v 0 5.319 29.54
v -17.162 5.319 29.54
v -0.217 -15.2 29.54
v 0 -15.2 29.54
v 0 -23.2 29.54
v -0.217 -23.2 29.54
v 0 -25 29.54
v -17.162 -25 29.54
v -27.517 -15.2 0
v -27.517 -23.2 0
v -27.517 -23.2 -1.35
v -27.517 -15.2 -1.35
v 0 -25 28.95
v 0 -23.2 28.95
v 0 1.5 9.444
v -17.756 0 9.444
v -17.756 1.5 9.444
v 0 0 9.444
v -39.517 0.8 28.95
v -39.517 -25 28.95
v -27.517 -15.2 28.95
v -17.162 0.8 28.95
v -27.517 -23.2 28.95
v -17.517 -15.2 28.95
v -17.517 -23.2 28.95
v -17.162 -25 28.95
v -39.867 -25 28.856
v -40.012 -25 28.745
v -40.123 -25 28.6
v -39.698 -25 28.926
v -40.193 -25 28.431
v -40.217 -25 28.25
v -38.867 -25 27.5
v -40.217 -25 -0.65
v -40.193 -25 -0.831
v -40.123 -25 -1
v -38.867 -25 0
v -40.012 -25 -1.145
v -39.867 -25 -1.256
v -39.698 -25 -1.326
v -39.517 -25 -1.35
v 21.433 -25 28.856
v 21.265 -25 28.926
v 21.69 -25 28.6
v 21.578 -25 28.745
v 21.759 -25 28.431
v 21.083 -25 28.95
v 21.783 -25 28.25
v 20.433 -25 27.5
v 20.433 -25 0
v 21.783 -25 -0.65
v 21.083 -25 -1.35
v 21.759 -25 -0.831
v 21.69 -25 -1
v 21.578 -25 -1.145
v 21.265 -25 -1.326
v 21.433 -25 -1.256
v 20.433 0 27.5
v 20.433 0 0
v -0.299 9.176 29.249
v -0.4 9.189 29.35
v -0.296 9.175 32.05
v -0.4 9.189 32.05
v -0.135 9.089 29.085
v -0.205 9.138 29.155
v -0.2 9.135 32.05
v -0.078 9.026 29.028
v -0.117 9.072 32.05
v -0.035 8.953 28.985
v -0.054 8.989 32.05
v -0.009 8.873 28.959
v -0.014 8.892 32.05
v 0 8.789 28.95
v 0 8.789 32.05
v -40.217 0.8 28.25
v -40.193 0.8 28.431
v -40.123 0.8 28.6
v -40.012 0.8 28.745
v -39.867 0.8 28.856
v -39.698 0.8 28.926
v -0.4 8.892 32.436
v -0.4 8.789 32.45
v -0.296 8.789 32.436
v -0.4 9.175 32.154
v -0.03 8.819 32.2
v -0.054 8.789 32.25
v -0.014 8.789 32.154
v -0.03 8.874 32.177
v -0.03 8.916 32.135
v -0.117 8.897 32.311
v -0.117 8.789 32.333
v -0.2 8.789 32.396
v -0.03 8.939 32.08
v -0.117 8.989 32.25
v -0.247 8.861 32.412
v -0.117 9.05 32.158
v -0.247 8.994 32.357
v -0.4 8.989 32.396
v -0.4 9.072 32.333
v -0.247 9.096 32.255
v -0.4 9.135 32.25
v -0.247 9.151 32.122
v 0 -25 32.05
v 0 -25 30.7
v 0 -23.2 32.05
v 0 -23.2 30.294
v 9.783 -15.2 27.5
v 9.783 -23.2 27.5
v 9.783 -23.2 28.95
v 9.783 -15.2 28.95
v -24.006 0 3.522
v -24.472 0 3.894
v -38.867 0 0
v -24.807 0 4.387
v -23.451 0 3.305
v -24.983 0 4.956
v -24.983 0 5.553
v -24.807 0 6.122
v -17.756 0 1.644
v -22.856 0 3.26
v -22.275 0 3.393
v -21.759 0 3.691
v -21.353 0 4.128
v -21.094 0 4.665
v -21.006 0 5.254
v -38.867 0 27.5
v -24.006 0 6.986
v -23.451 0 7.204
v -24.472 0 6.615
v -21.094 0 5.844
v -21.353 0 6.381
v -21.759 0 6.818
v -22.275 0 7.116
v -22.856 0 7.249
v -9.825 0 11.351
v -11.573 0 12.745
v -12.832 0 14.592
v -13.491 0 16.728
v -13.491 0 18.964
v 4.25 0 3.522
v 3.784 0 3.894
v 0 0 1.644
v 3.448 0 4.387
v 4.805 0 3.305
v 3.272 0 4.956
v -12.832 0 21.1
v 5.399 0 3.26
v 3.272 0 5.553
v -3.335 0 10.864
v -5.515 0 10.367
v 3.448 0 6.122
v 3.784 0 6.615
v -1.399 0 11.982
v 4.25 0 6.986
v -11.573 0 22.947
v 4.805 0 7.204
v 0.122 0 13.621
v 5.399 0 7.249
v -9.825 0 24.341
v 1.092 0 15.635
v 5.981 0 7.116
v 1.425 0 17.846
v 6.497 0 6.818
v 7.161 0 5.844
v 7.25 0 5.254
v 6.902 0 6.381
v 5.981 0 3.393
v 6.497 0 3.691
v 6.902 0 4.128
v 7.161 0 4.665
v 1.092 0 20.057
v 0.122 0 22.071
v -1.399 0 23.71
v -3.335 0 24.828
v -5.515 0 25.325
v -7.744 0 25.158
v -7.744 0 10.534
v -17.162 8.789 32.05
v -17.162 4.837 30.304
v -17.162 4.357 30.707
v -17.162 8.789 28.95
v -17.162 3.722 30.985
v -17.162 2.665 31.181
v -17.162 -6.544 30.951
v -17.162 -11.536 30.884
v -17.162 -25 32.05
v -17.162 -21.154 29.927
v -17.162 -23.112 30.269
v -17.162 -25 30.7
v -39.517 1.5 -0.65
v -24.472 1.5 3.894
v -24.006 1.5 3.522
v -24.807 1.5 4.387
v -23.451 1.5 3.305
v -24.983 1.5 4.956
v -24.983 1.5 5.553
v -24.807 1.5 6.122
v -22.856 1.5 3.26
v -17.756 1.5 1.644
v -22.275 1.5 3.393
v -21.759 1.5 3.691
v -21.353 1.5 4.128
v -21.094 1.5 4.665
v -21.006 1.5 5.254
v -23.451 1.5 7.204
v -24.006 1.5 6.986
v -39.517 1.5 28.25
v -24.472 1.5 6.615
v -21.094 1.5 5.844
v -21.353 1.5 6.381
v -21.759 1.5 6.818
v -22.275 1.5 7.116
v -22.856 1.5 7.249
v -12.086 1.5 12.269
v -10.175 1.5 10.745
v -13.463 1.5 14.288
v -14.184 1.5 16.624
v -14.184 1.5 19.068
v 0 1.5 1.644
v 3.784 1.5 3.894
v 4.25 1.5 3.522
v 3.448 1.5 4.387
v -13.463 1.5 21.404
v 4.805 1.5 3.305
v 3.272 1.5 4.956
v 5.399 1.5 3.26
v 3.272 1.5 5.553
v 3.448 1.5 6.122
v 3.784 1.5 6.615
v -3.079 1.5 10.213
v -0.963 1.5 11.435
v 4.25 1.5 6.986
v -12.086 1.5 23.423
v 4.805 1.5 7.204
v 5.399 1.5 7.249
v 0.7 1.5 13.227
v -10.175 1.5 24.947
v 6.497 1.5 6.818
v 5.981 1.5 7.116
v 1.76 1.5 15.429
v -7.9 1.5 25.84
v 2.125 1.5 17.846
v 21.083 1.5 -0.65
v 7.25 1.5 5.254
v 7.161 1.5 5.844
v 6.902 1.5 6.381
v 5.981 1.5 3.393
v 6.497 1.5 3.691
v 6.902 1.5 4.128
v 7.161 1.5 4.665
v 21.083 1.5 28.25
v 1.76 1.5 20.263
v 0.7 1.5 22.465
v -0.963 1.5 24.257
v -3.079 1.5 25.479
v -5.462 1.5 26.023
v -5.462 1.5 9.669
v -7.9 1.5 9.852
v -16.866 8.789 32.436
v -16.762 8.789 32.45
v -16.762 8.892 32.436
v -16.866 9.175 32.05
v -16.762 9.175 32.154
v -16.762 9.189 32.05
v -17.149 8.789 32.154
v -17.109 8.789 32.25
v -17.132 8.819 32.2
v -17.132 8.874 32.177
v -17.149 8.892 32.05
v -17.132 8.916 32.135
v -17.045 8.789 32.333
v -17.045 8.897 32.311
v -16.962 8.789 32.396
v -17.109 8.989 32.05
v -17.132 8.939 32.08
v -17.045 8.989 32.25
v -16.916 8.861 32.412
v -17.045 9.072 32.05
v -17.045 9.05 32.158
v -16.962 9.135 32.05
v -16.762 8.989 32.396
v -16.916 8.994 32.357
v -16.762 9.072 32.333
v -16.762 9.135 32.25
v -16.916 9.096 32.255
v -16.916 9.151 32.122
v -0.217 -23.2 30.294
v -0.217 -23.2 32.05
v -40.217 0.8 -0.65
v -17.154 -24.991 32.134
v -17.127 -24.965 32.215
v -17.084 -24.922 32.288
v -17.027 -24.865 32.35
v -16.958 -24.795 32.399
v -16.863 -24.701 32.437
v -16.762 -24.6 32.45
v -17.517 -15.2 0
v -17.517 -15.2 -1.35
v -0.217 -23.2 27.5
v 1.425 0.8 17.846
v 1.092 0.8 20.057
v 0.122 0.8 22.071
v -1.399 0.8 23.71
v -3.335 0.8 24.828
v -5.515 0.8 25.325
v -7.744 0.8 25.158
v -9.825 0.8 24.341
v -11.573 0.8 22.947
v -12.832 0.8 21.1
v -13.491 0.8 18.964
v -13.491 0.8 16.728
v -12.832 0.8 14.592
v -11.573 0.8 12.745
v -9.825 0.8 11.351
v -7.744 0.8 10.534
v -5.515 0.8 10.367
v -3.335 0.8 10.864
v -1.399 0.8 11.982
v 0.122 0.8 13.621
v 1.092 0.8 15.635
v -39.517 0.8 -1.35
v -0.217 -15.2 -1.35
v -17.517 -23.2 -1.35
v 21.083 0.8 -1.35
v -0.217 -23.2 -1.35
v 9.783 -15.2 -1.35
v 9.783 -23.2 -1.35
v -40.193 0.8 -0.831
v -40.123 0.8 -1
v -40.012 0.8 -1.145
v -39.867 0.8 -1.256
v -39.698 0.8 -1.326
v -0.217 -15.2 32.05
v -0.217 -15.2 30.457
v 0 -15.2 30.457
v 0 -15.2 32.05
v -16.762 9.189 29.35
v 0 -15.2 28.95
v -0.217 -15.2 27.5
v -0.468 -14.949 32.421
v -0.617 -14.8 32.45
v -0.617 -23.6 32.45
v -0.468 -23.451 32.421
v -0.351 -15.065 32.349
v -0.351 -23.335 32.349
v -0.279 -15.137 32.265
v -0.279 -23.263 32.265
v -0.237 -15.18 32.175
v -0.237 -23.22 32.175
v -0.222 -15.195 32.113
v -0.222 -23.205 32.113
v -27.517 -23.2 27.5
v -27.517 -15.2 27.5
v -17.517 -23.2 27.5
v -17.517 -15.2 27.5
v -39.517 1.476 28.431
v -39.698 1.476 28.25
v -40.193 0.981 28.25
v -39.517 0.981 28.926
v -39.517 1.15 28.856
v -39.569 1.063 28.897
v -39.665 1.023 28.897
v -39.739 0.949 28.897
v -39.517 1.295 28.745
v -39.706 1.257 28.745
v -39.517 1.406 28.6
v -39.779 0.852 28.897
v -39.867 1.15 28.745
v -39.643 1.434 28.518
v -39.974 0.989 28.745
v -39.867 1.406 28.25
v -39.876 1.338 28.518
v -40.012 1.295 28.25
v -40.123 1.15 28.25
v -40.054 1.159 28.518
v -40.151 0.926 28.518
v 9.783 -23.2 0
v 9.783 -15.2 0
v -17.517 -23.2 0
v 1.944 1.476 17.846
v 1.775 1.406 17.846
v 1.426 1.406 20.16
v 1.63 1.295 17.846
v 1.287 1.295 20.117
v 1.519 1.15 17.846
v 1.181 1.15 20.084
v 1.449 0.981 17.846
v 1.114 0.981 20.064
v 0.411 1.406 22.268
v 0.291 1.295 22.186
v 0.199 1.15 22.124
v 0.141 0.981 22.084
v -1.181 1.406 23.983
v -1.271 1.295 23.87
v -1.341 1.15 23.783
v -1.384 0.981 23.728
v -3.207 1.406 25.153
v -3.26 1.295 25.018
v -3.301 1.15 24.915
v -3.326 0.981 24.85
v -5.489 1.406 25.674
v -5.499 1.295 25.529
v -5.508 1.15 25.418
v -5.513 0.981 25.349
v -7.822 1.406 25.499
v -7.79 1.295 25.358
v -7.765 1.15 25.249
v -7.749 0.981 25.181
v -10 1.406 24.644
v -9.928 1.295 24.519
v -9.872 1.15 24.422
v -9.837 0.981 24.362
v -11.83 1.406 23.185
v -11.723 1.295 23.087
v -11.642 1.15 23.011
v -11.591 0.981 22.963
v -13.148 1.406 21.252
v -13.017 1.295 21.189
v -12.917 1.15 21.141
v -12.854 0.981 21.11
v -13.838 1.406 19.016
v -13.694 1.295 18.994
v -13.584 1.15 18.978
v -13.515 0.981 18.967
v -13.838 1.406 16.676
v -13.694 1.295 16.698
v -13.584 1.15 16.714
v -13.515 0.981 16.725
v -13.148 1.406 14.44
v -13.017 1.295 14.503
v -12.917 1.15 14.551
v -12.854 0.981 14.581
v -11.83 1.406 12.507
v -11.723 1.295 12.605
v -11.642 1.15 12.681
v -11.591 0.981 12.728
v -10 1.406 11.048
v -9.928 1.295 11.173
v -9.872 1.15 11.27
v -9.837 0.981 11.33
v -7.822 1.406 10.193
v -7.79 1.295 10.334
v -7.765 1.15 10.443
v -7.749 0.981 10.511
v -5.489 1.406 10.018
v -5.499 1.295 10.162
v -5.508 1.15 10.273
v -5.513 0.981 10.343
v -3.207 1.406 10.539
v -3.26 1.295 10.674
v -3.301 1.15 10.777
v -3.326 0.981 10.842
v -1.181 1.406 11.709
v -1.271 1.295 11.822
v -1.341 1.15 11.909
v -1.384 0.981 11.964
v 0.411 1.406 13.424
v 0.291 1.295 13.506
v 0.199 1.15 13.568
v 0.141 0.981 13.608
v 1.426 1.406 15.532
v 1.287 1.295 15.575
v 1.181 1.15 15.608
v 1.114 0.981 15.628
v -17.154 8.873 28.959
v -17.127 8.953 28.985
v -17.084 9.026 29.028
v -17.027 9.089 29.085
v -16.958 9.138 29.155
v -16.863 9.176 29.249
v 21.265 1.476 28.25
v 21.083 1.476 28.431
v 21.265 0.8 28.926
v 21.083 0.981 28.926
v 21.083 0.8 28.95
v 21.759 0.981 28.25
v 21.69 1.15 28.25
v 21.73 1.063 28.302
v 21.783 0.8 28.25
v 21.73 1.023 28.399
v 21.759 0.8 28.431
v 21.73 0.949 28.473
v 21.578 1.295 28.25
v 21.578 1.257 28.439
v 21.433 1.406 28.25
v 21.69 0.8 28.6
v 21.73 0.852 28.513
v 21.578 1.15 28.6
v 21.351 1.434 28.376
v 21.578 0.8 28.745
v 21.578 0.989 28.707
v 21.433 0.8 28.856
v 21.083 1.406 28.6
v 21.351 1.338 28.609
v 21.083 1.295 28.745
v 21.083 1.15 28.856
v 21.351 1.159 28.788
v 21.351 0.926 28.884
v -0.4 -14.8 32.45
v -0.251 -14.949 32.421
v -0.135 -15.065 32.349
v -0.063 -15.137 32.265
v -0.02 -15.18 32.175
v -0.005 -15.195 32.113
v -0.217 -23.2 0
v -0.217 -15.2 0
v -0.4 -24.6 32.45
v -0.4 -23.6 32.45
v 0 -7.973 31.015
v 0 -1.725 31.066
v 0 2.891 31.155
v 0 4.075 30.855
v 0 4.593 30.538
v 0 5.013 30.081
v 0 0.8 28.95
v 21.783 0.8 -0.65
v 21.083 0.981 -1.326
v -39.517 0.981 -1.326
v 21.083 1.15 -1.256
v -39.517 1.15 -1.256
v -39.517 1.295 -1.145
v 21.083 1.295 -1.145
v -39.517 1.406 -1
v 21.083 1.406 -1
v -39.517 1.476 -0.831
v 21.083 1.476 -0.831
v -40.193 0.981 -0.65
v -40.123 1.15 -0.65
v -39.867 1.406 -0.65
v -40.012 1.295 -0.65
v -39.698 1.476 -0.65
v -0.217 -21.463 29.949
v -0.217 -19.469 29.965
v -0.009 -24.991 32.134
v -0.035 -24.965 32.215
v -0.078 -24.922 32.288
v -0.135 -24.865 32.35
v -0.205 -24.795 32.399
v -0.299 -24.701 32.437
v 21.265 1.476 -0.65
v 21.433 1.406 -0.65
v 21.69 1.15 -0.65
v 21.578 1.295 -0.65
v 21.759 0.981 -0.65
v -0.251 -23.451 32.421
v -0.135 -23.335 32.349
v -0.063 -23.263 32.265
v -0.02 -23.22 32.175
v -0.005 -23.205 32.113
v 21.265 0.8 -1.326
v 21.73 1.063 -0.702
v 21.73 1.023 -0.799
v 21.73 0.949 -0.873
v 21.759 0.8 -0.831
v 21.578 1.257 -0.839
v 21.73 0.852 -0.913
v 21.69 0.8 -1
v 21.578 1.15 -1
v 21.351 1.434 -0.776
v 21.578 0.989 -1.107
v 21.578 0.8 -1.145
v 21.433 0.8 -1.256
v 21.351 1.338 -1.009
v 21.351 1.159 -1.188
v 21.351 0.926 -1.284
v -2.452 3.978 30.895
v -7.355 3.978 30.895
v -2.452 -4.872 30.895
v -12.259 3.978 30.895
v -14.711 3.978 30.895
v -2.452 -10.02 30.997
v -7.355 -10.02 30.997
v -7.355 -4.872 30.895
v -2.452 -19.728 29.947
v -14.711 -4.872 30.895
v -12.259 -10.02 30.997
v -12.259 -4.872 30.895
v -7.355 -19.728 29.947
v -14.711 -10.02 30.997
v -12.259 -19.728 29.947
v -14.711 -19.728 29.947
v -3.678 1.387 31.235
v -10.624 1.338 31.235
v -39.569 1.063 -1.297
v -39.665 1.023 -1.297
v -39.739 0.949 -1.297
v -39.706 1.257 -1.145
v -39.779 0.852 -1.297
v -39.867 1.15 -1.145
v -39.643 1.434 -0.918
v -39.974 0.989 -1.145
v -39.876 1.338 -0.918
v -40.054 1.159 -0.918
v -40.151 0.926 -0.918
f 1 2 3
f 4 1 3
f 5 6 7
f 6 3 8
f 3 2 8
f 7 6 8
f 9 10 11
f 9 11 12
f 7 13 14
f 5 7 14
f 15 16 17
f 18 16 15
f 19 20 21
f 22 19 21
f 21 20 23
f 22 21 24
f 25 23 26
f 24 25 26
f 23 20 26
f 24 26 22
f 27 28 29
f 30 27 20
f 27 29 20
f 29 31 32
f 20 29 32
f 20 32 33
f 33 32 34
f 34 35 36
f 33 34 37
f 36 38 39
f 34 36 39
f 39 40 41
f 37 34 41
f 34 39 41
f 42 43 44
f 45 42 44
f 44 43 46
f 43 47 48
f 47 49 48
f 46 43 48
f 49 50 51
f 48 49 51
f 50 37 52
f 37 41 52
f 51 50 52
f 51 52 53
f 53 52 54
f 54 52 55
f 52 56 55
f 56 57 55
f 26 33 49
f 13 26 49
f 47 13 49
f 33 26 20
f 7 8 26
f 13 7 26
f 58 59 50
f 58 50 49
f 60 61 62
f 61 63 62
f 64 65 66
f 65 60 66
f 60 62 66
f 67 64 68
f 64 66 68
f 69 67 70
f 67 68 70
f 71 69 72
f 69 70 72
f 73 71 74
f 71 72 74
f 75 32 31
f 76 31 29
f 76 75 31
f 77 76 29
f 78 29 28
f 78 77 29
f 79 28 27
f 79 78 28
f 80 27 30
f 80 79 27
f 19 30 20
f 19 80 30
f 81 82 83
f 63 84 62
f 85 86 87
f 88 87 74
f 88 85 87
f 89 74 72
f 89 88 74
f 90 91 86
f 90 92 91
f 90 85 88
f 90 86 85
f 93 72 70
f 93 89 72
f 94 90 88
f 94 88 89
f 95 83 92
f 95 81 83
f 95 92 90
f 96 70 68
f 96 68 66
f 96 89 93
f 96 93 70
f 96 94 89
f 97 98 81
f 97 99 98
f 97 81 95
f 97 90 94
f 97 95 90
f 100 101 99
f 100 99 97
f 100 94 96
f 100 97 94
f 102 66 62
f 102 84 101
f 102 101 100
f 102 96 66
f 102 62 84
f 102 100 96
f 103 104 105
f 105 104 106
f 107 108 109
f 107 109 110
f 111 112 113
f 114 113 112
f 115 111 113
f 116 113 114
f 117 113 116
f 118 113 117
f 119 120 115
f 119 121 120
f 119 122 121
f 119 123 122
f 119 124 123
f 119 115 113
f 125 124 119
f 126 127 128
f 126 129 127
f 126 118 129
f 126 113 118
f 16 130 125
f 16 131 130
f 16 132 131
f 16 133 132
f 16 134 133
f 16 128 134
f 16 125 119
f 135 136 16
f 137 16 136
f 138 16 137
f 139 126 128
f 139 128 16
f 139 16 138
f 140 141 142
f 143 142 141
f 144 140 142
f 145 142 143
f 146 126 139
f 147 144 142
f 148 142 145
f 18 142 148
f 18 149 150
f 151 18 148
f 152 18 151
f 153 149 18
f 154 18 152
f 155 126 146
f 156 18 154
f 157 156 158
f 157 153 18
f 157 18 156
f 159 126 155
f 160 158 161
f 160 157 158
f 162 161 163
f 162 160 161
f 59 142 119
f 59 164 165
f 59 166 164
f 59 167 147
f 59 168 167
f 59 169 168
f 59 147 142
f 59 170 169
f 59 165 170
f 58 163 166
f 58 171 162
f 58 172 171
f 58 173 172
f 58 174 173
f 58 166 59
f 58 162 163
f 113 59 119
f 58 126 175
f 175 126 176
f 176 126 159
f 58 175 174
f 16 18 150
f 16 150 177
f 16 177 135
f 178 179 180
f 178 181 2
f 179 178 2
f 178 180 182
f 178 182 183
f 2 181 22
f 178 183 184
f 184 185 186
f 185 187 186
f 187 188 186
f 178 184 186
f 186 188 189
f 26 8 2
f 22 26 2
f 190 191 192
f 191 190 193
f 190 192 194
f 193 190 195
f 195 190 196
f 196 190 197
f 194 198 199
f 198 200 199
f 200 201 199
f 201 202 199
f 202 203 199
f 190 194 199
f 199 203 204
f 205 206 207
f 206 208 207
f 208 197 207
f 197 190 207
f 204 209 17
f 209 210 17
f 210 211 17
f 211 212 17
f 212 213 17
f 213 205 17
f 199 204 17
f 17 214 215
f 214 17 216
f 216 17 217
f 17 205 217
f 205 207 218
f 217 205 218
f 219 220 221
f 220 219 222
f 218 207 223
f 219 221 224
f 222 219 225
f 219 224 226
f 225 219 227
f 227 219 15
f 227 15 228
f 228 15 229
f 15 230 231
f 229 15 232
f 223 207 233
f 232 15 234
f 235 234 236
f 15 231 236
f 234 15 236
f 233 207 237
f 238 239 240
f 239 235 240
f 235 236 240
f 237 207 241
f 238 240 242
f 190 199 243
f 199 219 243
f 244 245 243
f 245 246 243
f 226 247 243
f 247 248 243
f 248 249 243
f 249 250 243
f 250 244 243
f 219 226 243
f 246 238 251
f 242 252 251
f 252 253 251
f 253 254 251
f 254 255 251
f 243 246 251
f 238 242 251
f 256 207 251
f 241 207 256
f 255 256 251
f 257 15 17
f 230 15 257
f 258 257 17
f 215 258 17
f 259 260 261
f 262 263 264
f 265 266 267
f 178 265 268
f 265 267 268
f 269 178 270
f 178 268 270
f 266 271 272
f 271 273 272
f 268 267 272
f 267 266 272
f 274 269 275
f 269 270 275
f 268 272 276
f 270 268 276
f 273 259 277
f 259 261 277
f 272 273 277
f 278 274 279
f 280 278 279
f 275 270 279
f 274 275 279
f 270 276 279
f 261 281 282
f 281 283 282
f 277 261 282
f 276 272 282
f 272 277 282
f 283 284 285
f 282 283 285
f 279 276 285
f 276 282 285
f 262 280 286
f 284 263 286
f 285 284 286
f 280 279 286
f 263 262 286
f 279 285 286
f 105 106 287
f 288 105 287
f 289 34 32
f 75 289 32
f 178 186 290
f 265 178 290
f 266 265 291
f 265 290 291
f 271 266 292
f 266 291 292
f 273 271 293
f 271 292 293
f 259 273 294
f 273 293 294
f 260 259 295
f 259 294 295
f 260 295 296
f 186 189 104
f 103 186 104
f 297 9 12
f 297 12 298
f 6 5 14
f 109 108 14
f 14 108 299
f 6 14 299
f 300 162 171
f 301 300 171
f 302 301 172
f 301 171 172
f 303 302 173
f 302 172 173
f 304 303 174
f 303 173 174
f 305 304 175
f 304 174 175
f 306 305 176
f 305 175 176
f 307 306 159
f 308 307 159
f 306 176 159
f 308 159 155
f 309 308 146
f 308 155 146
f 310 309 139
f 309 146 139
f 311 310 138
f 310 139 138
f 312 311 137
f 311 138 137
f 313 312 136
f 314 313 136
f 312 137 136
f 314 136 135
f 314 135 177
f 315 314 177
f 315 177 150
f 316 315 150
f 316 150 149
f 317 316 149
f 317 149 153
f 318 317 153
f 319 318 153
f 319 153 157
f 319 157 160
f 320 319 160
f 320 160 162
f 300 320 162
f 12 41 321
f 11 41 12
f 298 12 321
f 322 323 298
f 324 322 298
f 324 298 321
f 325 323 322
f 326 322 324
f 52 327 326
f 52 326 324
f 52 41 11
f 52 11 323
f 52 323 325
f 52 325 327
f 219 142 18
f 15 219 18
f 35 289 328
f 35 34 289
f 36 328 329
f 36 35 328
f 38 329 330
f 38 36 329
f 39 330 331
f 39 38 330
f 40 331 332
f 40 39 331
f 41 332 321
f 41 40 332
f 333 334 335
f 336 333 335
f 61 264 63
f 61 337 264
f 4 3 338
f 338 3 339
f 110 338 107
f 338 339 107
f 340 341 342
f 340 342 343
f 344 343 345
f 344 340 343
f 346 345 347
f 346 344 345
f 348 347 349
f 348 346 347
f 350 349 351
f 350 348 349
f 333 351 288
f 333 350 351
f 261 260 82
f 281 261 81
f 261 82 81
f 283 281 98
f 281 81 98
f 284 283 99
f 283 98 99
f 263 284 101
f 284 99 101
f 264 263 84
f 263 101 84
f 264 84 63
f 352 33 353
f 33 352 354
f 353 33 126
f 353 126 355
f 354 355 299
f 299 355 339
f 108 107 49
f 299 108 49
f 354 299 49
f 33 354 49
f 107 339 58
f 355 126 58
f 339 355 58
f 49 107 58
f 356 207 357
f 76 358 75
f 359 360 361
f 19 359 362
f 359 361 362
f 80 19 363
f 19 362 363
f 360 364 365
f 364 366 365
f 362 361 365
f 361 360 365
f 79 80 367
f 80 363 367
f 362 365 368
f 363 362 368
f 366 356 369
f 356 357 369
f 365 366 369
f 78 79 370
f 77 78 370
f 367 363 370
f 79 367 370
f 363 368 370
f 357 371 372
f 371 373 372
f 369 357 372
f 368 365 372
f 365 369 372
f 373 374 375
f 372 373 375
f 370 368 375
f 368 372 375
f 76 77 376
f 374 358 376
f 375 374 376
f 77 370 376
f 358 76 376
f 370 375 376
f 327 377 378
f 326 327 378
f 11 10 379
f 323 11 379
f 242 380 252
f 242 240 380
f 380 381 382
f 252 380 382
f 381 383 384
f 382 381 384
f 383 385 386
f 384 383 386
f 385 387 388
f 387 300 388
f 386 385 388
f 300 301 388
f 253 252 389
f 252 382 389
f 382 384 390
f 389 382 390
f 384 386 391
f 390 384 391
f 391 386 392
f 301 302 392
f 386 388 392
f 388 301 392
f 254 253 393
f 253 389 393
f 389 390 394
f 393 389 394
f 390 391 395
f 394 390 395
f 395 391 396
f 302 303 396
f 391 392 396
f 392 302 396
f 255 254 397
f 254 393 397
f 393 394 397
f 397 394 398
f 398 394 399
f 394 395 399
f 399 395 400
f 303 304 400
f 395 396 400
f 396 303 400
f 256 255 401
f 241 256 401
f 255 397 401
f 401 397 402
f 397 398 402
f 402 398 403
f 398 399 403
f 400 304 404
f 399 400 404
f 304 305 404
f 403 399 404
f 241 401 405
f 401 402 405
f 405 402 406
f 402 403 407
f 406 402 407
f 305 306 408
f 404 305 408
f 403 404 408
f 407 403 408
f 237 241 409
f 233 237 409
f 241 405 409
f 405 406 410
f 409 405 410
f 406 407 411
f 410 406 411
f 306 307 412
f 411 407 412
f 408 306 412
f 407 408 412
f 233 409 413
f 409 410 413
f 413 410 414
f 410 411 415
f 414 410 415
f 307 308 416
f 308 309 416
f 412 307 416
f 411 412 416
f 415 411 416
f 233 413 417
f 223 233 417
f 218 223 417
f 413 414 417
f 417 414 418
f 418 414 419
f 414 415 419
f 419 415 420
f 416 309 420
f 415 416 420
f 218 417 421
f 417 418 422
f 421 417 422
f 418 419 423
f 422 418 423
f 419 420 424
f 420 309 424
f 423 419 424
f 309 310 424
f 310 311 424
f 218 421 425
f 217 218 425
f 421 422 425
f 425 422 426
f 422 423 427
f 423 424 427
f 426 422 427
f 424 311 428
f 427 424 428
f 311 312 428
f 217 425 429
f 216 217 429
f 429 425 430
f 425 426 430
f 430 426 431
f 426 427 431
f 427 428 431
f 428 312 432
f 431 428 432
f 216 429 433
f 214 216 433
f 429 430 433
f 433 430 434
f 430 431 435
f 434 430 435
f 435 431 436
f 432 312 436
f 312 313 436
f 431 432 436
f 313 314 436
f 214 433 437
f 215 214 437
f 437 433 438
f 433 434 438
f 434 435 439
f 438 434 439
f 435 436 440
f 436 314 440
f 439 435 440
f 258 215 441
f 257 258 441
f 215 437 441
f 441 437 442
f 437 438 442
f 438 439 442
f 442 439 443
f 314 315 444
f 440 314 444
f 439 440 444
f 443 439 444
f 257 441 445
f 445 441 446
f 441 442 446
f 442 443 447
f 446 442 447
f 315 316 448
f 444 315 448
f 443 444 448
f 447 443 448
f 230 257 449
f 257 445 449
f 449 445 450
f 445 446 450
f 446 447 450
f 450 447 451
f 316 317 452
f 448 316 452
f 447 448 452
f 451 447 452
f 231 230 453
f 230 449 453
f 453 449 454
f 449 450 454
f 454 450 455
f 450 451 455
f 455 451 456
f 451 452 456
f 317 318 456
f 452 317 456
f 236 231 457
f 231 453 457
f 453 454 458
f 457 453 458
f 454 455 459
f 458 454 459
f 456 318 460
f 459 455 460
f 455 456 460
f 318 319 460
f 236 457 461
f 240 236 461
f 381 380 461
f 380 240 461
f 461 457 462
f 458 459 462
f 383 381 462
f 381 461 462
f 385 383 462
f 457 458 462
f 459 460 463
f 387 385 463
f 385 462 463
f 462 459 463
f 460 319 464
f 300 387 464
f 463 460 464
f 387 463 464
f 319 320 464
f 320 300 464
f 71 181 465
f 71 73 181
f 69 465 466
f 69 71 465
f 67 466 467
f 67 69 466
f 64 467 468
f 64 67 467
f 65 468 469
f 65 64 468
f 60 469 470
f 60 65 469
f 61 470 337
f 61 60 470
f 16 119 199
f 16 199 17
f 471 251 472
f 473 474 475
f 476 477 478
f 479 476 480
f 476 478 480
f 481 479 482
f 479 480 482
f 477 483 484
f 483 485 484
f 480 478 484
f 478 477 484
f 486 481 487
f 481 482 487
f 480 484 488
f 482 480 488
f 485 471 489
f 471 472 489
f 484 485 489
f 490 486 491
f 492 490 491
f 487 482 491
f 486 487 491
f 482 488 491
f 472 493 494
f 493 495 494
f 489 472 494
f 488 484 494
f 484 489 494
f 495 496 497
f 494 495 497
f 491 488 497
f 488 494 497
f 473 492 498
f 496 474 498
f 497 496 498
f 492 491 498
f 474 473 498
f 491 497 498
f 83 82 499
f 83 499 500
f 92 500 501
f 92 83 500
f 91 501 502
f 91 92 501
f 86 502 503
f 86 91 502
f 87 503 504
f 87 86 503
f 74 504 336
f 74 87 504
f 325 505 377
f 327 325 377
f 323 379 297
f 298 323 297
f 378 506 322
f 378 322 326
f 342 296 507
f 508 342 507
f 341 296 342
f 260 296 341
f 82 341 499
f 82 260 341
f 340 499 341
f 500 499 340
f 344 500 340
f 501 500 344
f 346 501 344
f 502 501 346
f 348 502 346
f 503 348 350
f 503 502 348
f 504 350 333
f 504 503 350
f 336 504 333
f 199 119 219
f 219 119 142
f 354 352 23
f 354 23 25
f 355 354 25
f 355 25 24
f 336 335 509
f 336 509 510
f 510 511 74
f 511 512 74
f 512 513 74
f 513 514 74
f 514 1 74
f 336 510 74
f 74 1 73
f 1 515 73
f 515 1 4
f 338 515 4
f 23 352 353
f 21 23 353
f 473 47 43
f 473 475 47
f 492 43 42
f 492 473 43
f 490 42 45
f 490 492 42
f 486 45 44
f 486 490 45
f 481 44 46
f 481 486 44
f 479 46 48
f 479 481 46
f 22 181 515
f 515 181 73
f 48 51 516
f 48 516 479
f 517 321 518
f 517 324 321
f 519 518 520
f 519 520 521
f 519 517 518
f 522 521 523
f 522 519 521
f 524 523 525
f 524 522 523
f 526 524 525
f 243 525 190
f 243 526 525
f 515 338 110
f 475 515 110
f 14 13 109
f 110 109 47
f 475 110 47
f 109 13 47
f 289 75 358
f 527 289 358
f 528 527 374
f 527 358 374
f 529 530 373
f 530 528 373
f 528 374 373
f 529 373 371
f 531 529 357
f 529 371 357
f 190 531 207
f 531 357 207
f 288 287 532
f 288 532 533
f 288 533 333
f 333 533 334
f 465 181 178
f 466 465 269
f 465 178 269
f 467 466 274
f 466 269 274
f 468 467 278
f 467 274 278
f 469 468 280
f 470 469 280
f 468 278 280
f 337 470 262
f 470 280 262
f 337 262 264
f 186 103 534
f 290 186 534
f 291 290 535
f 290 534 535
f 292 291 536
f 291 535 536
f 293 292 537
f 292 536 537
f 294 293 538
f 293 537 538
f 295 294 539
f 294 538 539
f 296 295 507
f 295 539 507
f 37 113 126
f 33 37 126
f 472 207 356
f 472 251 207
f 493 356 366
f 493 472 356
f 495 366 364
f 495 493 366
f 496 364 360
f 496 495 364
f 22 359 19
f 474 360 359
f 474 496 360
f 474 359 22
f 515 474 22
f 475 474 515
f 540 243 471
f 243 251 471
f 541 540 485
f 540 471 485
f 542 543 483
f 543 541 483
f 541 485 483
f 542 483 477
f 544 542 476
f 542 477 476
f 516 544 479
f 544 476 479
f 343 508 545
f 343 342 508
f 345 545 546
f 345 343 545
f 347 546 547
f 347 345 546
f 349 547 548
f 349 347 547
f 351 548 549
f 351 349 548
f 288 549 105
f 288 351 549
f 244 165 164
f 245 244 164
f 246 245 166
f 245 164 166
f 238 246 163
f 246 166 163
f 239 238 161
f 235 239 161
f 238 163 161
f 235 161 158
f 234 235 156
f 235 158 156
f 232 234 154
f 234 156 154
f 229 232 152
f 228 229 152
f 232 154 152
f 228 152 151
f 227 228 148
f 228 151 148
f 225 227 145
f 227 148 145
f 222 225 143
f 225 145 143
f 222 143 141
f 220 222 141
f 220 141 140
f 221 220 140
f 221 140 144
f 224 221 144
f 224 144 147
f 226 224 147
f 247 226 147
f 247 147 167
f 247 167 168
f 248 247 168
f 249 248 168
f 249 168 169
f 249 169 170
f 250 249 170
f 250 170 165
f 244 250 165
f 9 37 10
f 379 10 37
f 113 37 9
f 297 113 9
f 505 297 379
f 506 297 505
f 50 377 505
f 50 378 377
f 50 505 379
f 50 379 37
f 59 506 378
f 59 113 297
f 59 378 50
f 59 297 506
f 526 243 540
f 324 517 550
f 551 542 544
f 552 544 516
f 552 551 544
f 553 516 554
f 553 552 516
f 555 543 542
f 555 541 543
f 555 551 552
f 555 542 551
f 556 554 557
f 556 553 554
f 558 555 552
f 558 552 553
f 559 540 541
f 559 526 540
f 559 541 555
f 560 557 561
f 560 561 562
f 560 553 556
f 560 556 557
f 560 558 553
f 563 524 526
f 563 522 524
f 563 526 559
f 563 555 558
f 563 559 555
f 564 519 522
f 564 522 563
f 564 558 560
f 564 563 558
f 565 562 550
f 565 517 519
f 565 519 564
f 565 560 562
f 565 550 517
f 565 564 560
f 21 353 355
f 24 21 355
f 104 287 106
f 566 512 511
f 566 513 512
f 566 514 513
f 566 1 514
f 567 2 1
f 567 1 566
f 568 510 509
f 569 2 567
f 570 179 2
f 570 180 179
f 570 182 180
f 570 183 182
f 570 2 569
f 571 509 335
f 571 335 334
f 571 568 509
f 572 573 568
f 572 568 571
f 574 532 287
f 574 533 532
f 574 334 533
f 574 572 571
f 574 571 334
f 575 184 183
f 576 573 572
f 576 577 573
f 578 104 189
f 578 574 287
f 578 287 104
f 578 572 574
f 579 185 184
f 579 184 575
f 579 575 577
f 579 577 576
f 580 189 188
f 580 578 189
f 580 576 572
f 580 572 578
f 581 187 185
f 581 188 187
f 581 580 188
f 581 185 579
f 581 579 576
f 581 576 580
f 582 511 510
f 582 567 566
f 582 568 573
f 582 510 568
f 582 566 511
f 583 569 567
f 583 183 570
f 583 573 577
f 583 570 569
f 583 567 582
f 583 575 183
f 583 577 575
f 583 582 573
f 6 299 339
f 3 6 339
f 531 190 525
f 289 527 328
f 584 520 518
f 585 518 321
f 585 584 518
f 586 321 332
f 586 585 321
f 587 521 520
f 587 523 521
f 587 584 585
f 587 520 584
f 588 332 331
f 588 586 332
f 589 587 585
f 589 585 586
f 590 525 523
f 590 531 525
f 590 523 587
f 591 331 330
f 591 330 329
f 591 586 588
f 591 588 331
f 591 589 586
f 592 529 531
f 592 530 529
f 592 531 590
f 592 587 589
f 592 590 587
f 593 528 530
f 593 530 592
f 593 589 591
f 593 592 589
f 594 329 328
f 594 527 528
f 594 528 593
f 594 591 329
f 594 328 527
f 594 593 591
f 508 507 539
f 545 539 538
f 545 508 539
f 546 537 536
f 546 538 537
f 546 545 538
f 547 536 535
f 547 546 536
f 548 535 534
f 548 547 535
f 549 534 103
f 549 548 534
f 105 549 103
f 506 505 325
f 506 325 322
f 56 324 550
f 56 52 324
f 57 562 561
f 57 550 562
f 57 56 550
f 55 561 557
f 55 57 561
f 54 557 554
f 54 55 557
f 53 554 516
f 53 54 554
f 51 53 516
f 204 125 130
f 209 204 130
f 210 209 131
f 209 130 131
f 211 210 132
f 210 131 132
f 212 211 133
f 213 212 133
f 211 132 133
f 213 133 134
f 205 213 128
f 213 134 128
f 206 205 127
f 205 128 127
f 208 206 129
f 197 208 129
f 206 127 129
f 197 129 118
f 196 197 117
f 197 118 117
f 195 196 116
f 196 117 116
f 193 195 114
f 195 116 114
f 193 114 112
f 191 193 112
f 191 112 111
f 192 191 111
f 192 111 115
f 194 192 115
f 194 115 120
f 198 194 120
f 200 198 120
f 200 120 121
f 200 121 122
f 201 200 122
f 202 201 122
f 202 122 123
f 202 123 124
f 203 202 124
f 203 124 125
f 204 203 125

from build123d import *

# Parameters (mm, degrees)
F1_W           = 62
F1_H           = 30.3
F2_DEPTH       = 25
F2_DEPTH_BACK  = 1.5
F0_W           = 59.3
F0_H           = 27.5
F3_DEPTH       = 25
F4_R           = 7.5
F5_DEPTH       = 5
F6_R           = 0.7
F7_W           = 10
F7_H           = 8
F8_DEPTH       = 45
F8_DEPTH_BACK  = 5
F9_W           = 10
F9_H           = 8
F10_DEPTH      = 45
F10_DEPTH_BACK = 5
F11_W          = 17.1624887735
F11_H          = 8.3887656599
F12_DEPTH      = 3.5
F14_DEPTH      = 25
F15_R          = 2
F15_W          = 17.7555382252
F15_H          = 7.8
F16_DEPTH      = 5
F17_R          = 0.4


with BuildPart() as f2:
    # F1 (on Front) → F2 (new body, two sides)
    with BuildSketch(Plane.XZ) as f2_sk:
        with Locations((-9.2166643556, 13.8)):
            Rectangle(F1_W, F1_H)
    extrude(amount=F2_DEPTH)
    extrude(f2_sk.sketch, amount=-F2_DEPTH_BACK)

    # F0 (on Front) → F3 (cut)
    with BuildSketch(Plane.XZ):
        with Locations((-9.2166643556, 13.75)):
            Rectangle(F0_W, F0_H)
    extrude(amount=F3_DEPTH, mode=Mode.SUBTRACT)

    # F4 (on face) → F5 (cut)
    with BuildSketch(Plane.XZ):
        with Locations((-6.0752169229, 17.8459510207)):
            Circle(F4_R)
    extrude(amount=-F5_DEPTH, mode=Mode.SUBTRACT)

    # F6
    f6_edges = [f2.edges().sort_by_distance(p)[0] for p in [
        (-40.216664, 1.5, 13.8),
        (-9.216664, 1.5, 28.95),
        (-9.216664, 1.5, -1.35),
        (21.783336, 1.5, 13.8),
        (-13.575217, 1.5, 17.845951),
        (-40.216664, -11.75, -1.35),
        (21.783336, -11.75, -1.35),
        (-40.216664, -11.75, 28.95),
        (21.783336, -11.75, 28.95),
    ]]
    fillet(f6_edges, radius=F6_R)

    # F7 (on Top) → F8 (cut, two sides)
    with BuildSketch(Plane.XY) as f8_sk:
        with Locations((-22.5166643556, -19.2)):
            Rectangle(F7_W, F7_H)
    extrude(amount=F8_DEPTH, mode=Mode.SUBTRACT)
    extrude(f8_sk.sketch, amount=-F8_DEPTH_BACK, mode=Mode.SUBTRACT)

    # F9 (on Top) → F10 (cut, two sides)
    with BuildSketch(Plane.XY) as f10_sk:
        with Locations((4.7833356444, -19.2)):
            Rectangle(F9_W, F9_H)
    extrude(amount=F10_DEPTH, mode=Mode.SUBTRACT)
    extrude(f10_sk.sketch, amount=-F10_DEPTH_BACK, mode=Mode.SUBTRACT)

    # F11 (on face) → F12 (join)
    with BuildSketch(Plane.XY.offset(28.95)):
        with Locations((-8.5812443867, 4.99438283)):
            Rectangle(F11_W, F11_H)
        Polygon((-17.1624887735, 0.8), (-17.1624887735, -25), (0, -25), (0, -23.2), (-0.2166643556, -23.2), (-0.2166643556, -15.2), (0, -15.2), (0, 0.8), align=None)
    extrude(amount=F12_DEPTH)

    # F13 (on face) → F14 (cut)
    with BuildSketch(Plane(origin=(-17.1624887735, 0, 0), x_dir=(0, -1, 0), z_dir=(-1, 0, 0))):
        with BuildLine():
            Line((25, 29.5397602022), (25, 30.7))
            add(Edge.make_bspline(
                [(-5.3185094148, 29.5397602022), (-5.0194907216, 30.1895282865), (-4.0777484074, 31.2751947082), (0.1656733941, 31.273480595), (5.0517480146, 30.6919086163), (9.849243279, 31.3916847552), (19.6642698069, 29.6875462454), (22.594998302, 30.0402251841), (24.287338472, 30.642664728), (25, 30.7)],
                knots=[0, 0, 0, 0, 0.0969434491, 0.2371816387, 0.3923007199, 0.5516305114, 0.7710331834, 0.8933299971, 1, 1, 1, 1], degree=3))
            Line((-5.3185094148, 29.5397602022), (25, 29.5397602022))
        make_face()
    extrude(amount=-F14_DEPTH, mode=Mode.SUBTRACT)

    # F15 (on face) → F16 (cut)
    with BuildSketch(Plane.XZ):
        with Locations((-23.0055382252, 5.2544213831)):
            Circle(F15_R)
        with Locations((5.25, 5.2544213831)):
            Circle(F15_R)
        with Locations((-8.8777691126, 5.5436356924)):
            Rectangle(F15_W, F15_H)
    extrude(amount=-F16_DEPTH, mode=Mode.SUBTRACT)

    # F17
    f17_edges = [f2.edges().sort_by_distance(p)[0] for p in [
        (-8.581244, 9.188766, 32.45),
        (-17.162489, -7.905617, 32.45),
        (-8.581244, -25, 32.45),
        (0, -24.1, 32.45),
        (-0.108332, -23.2, 32.45),
        (-0.216664, -19.2, 32.45),
        (-0.108332, -15.2, 32.45),
        (0, -3.005617, 32.45),
        (-8.581244, 9.188766, 28.95),
        (0, 9.188766, 30.7),
        (-17.162489, 9.188766, 30.7),
    ]]
    fillet(f17_edges, radius=F17_R)


solid = f2.part
